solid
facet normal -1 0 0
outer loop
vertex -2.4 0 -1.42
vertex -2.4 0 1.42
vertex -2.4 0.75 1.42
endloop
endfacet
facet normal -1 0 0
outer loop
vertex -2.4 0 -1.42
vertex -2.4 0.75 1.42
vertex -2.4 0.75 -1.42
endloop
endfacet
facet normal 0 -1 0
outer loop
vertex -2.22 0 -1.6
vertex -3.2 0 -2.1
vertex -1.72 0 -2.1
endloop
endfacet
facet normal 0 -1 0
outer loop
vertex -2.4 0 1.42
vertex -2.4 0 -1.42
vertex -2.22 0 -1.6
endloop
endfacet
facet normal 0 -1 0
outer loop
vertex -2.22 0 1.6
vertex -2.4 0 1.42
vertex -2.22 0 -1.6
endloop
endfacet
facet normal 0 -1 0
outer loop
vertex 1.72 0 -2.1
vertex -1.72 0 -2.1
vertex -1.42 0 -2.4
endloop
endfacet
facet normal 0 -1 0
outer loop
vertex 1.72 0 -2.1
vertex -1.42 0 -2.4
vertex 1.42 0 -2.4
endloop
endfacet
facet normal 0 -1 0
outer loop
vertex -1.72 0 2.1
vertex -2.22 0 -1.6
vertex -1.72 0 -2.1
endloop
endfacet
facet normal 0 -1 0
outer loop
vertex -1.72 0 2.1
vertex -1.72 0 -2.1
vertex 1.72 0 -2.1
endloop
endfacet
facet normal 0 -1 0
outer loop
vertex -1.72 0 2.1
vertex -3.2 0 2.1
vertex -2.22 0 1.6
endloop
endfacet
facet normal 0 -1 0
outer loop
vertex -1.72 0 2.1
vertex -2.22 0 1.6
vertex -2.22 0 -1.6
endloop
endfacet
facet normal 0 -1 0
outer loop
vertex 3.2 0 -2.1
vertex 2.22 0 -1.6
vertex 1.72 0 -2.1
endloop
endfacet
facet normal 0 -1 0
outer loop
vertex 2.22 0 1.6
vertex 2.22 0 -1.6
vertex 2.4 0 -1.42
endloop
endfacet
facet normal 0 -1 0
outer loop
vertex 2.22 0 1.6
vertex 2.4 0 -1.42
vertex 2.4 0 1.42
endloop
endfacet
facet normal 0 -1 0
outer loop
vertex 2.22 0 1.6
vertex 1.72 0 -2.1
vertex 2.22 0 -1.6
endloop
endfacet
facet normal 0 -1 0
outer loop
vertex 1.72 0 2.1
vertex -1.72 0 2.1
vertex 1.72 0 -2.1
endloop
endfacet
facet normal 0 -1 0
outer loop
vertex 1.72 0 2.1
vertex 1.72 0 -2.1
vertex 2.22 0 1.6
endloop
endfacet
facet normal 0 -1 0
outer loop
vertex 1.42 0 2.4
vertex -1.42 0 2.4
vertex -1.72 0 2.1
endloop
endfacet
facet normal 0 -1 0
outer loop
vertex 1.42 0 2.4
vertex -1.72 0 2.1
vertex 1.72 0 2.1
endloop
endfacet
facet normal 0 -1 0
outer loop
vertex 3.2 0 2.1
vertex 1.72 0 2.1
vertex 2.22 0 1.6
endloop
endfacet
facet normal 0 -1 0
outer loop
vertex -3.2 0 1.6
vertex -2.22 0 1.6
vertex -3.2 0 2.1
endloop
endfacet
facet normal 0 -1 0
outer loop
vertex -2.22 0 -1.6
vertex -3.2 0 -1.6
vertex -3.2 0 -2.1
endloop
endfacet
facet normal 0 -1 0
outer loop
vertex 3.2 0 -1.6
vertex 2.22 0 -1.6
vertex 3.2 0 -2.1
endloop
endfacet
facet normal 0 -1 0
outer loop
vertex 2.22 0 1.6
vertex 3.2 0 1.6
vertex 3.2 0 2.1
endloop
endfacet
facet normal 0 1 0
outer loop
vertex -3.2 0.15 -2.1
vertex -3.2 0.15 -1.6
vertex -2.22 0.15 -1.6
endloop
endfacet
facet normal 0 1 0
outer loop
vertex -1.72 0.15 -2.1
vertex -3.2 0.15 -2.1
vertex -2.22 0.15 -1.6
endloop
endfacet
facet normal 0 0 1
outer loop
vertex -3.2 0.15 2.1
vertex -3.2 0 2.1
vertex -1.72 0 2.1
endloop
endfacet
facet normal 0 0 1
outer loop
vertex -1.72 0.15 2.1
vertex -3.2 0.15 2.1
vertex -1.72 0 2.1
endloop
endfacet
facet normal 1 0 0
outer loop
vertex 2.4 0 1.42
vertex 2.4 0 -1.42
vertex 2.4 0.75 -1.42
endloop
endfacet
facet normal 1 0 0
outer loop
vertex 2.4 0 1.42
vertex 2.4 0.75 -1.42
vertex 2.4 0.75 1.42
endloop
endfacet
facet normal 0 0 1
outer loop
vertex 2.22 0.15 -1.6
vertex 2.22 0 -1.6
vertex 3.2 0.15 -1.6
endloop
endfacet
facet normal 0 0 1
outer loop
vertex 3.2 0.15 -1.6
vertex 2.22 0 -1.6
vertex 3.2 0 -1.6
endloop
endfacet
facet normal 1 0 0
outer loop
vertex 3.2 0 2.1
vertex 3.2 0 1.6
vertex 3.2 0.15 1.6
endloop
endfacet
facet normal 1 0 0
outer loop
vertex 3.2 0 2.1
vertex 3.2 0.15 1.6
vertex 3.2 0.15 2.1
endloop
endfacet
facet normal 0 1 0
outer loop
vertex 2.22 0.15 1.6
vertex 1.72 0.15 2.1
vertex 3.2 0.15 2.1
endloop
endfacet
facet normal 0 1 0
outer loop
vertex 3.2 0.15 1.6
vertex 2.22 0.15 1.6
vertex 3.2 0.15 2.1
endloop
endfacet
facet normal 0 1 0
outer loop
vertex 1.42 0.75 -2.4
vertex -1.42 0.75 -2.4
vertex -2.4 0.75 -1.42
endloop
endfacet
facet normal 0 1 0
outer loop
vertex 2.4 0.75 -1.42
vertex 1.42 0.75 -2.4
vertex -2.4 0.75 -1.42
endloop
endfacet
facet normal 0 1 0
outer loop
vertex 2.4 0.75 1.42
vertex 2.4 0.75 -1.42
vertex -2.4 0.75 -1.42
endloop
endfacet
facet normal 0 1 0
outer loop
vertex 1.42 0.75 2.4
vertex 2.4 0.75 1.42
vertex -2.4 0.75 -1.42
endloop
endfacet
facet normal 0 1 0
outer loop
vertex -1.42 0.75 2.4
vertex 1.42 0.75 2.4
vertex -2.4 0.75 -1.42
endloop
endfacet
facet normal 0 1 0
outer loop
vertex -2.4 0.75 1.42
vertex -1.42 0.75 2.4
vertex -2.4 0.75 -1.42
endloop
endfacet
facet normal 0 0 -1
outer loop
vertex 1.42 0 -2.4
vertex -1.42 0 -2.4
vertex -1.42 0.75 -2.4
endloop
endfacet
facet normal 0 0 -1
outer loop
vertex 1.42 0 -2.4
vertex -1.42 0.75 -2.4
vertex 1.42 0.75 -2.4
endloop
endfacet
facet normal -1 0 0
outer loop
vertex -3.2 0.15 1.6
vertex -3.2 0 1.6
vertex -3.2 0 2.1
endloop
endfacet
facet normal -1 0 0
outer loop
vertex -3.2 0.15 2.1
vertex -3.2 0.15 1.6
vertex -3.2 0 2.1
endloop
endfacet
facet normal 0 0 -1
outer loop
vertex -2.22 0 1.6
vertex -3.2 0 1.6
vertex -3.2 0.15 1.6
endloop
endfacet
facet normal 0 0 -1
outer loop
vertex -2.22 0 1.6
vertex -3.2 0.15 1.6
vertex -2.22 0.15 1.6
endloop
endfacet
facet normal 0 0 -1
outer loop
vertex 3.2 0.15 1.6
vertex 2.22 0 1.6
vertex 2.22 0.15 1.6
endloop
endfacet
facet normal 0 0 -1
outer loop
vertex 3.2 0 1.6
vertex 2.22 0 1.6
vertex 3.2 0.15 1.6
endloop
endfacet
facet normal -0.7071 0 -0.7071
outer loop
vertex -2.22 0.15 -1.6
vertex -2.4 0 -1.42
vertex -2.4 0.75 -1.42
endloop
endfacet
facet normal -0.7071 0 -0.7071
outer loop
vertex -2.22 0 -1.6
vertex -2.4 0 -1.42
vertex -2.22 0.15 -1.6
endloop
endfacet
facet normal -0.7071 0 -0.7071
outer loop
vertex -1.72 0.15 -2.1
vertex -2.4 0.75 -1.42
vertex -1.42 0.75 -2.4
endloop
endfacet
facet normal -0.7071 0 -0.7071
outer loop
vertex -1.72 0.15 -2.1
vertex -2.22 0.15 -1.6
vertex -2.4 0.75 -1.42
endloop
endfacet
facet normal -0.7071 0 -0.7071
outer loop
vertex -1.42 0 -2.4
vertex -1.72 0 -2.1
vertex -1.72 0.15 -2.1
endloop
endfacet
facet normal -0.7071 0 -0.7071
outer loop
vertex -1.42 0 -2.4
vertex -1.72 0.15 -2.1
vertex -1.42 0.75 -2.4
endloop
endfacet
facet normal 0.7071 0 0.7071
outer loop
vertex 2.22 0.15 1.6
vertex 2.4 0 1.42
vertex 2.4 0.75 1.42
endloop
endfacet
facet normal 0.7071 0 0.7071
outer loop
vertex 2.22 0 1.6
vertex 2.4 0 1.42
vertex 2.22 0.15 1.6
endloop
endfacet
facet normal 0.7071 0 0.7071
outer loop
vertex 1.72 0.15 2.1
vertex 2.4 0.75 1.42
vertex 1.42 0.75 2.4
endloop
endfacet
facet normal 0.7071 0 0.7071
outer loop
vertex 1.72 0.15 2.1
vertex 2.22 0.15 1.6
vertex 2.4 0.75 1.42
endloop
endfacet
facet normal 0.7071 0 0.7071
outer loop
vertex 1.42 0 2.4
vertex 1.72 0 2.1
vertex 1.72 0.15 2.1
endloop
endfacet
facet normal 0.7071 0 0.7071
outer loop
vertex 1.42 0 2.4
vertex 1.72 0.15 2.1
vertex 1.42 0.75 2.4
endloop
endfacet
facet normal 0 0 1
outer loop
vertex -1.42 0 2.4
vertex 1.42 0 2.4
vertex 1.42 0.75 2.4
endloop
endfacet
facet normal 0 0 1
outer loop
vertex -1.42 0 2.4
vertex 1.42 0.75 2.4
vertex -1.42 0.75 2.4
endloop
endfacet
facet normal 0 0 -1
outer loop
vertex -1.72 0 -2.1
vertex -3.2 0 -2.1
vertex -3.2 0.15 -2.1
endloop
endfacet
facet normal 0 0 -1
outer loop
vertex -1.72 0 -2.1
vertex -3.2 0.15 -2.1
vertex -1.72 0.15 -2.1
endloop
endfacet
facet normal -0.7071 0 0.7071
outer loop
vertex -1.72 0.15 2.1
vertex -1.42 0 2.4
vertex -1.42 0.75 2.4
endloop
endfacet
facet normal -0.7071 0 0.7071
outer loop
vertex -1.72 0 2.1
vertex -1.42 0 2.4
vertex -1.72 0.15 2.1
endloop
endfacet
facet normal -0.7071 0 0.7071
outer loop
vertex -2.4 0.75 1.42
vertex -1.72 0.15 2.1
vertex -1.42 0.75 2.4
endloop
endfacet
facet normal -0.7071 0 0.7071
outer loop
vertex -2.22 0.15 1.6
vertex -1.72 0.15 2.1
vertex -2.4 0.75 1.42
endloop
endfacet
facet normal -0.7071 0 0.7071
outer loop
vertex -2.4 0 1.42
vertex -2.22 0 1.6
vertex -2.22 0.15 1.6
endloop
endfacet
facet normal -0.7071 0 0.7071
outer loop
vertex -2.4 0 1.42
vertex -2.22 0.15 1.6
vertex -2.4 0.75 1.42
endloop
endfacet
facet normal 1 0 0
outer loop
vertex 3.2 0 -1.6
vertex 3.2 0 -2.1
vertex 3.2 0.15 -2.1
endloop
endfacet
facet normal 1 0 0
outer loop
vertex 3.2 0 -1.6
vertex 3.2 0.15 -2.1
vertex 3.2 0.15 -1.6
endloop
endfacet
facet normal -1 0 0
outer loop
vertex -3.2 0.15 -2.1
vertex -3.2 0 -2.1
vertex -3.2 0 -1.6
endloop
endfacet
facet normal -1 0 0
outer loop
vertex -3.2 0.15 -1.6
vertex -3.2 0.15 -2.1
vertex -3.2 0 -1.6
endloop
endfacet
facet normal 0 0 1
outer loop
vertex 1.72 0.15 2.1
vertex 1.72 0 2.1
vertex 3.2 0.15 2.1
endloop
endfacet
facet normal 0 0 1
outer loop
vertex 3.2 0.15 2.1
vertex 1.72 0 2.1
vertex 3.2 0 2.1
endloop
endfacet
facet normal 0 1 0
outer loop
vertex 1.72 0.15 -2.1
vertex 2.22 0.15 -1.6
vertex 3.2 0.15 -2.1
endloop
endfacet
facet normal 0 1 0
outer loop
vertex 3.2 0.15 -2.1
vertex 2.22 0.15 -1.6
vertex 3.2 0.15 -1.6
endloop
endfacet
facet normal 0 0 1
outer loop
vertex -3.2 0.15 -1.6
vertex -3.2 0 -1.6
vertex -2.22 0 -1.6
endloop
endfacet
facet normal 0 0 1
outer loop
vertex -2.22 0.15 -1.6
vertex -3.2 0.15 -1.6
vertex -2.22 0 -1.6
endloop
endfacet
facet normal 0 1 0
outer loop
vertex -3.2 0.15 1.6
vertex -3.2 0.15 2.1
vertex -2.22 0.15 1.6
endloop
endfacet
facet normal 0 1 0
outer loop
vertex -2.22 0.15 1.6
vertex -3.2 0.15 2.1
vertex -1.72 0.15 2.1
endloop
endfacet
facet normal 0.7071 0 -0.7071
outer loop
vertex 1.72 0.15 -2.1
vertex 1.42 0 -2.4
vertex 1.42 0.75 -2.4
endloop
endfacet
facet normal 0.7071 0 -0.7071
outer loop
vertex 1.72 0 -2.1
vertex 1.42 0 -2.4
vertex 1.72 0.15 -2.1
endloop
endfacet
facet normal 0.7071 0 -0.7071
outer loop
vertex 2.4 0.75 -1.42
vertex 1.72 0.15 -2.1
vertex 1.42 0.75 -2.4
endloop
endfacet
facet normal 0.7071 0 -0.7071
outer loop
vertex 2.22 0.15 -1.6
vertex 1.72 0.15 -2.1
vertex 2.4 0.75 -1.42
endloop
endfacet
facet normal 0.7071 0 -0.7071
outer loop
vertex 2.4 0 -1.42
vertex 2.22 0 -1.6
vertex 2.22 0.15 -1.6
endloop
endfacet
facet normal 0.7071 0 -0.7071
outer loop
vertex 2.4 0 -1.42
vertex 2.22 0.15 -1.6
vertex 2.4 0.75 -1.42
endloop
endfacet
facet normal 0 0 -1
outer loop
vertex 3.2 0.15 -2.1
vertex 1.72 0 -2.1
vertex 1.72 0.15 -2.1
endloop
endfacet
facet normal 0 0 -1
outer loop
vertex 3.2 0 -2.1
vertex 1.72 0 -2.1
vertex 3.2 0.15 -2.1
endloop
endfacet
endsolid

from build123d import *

# Parameters (mm, degrees)
EXTRUDE_1_DEPTH = 0.75
SKETCH_2_W      = 6.4
SKETCH_2_H      = 0.5
EXTRUDE_2_DEPTH = 0.15


with BuildPart() as part:
    # 草图1 → 凸台-拉伸1 (new body)
    with BuildSketch(Plane(origin=(0, 0, 0), x_dir=(1, 0, 0), z_dir=(0, 1, 0))):
        Polygon((-1.42, 2.4), (1.42, 2.4), (2.4, 1.42), (2.4, -1.42), (1.42, -2.4), (-1.42, -2.4), (-2.4, -1.42), (-2.4, 1.42), align=None)
    extrude(amount=EXTRUDE_1_DEPTH)

    # 草图2 → 凸台-拉伸2 (add)
    with BuildSketch(Plane.XZ):
        with Locations((0, 1.85)):
            Rectangle(SKETCH_2_W, SKETCH_2_H)
        with Locations((0, -1.85)):
            Rectangle(SKETCH_2_W, SKETCH_2_H)
    extrude(amount=-EXTRUDE_2_DEPTH)


solid = part.part
